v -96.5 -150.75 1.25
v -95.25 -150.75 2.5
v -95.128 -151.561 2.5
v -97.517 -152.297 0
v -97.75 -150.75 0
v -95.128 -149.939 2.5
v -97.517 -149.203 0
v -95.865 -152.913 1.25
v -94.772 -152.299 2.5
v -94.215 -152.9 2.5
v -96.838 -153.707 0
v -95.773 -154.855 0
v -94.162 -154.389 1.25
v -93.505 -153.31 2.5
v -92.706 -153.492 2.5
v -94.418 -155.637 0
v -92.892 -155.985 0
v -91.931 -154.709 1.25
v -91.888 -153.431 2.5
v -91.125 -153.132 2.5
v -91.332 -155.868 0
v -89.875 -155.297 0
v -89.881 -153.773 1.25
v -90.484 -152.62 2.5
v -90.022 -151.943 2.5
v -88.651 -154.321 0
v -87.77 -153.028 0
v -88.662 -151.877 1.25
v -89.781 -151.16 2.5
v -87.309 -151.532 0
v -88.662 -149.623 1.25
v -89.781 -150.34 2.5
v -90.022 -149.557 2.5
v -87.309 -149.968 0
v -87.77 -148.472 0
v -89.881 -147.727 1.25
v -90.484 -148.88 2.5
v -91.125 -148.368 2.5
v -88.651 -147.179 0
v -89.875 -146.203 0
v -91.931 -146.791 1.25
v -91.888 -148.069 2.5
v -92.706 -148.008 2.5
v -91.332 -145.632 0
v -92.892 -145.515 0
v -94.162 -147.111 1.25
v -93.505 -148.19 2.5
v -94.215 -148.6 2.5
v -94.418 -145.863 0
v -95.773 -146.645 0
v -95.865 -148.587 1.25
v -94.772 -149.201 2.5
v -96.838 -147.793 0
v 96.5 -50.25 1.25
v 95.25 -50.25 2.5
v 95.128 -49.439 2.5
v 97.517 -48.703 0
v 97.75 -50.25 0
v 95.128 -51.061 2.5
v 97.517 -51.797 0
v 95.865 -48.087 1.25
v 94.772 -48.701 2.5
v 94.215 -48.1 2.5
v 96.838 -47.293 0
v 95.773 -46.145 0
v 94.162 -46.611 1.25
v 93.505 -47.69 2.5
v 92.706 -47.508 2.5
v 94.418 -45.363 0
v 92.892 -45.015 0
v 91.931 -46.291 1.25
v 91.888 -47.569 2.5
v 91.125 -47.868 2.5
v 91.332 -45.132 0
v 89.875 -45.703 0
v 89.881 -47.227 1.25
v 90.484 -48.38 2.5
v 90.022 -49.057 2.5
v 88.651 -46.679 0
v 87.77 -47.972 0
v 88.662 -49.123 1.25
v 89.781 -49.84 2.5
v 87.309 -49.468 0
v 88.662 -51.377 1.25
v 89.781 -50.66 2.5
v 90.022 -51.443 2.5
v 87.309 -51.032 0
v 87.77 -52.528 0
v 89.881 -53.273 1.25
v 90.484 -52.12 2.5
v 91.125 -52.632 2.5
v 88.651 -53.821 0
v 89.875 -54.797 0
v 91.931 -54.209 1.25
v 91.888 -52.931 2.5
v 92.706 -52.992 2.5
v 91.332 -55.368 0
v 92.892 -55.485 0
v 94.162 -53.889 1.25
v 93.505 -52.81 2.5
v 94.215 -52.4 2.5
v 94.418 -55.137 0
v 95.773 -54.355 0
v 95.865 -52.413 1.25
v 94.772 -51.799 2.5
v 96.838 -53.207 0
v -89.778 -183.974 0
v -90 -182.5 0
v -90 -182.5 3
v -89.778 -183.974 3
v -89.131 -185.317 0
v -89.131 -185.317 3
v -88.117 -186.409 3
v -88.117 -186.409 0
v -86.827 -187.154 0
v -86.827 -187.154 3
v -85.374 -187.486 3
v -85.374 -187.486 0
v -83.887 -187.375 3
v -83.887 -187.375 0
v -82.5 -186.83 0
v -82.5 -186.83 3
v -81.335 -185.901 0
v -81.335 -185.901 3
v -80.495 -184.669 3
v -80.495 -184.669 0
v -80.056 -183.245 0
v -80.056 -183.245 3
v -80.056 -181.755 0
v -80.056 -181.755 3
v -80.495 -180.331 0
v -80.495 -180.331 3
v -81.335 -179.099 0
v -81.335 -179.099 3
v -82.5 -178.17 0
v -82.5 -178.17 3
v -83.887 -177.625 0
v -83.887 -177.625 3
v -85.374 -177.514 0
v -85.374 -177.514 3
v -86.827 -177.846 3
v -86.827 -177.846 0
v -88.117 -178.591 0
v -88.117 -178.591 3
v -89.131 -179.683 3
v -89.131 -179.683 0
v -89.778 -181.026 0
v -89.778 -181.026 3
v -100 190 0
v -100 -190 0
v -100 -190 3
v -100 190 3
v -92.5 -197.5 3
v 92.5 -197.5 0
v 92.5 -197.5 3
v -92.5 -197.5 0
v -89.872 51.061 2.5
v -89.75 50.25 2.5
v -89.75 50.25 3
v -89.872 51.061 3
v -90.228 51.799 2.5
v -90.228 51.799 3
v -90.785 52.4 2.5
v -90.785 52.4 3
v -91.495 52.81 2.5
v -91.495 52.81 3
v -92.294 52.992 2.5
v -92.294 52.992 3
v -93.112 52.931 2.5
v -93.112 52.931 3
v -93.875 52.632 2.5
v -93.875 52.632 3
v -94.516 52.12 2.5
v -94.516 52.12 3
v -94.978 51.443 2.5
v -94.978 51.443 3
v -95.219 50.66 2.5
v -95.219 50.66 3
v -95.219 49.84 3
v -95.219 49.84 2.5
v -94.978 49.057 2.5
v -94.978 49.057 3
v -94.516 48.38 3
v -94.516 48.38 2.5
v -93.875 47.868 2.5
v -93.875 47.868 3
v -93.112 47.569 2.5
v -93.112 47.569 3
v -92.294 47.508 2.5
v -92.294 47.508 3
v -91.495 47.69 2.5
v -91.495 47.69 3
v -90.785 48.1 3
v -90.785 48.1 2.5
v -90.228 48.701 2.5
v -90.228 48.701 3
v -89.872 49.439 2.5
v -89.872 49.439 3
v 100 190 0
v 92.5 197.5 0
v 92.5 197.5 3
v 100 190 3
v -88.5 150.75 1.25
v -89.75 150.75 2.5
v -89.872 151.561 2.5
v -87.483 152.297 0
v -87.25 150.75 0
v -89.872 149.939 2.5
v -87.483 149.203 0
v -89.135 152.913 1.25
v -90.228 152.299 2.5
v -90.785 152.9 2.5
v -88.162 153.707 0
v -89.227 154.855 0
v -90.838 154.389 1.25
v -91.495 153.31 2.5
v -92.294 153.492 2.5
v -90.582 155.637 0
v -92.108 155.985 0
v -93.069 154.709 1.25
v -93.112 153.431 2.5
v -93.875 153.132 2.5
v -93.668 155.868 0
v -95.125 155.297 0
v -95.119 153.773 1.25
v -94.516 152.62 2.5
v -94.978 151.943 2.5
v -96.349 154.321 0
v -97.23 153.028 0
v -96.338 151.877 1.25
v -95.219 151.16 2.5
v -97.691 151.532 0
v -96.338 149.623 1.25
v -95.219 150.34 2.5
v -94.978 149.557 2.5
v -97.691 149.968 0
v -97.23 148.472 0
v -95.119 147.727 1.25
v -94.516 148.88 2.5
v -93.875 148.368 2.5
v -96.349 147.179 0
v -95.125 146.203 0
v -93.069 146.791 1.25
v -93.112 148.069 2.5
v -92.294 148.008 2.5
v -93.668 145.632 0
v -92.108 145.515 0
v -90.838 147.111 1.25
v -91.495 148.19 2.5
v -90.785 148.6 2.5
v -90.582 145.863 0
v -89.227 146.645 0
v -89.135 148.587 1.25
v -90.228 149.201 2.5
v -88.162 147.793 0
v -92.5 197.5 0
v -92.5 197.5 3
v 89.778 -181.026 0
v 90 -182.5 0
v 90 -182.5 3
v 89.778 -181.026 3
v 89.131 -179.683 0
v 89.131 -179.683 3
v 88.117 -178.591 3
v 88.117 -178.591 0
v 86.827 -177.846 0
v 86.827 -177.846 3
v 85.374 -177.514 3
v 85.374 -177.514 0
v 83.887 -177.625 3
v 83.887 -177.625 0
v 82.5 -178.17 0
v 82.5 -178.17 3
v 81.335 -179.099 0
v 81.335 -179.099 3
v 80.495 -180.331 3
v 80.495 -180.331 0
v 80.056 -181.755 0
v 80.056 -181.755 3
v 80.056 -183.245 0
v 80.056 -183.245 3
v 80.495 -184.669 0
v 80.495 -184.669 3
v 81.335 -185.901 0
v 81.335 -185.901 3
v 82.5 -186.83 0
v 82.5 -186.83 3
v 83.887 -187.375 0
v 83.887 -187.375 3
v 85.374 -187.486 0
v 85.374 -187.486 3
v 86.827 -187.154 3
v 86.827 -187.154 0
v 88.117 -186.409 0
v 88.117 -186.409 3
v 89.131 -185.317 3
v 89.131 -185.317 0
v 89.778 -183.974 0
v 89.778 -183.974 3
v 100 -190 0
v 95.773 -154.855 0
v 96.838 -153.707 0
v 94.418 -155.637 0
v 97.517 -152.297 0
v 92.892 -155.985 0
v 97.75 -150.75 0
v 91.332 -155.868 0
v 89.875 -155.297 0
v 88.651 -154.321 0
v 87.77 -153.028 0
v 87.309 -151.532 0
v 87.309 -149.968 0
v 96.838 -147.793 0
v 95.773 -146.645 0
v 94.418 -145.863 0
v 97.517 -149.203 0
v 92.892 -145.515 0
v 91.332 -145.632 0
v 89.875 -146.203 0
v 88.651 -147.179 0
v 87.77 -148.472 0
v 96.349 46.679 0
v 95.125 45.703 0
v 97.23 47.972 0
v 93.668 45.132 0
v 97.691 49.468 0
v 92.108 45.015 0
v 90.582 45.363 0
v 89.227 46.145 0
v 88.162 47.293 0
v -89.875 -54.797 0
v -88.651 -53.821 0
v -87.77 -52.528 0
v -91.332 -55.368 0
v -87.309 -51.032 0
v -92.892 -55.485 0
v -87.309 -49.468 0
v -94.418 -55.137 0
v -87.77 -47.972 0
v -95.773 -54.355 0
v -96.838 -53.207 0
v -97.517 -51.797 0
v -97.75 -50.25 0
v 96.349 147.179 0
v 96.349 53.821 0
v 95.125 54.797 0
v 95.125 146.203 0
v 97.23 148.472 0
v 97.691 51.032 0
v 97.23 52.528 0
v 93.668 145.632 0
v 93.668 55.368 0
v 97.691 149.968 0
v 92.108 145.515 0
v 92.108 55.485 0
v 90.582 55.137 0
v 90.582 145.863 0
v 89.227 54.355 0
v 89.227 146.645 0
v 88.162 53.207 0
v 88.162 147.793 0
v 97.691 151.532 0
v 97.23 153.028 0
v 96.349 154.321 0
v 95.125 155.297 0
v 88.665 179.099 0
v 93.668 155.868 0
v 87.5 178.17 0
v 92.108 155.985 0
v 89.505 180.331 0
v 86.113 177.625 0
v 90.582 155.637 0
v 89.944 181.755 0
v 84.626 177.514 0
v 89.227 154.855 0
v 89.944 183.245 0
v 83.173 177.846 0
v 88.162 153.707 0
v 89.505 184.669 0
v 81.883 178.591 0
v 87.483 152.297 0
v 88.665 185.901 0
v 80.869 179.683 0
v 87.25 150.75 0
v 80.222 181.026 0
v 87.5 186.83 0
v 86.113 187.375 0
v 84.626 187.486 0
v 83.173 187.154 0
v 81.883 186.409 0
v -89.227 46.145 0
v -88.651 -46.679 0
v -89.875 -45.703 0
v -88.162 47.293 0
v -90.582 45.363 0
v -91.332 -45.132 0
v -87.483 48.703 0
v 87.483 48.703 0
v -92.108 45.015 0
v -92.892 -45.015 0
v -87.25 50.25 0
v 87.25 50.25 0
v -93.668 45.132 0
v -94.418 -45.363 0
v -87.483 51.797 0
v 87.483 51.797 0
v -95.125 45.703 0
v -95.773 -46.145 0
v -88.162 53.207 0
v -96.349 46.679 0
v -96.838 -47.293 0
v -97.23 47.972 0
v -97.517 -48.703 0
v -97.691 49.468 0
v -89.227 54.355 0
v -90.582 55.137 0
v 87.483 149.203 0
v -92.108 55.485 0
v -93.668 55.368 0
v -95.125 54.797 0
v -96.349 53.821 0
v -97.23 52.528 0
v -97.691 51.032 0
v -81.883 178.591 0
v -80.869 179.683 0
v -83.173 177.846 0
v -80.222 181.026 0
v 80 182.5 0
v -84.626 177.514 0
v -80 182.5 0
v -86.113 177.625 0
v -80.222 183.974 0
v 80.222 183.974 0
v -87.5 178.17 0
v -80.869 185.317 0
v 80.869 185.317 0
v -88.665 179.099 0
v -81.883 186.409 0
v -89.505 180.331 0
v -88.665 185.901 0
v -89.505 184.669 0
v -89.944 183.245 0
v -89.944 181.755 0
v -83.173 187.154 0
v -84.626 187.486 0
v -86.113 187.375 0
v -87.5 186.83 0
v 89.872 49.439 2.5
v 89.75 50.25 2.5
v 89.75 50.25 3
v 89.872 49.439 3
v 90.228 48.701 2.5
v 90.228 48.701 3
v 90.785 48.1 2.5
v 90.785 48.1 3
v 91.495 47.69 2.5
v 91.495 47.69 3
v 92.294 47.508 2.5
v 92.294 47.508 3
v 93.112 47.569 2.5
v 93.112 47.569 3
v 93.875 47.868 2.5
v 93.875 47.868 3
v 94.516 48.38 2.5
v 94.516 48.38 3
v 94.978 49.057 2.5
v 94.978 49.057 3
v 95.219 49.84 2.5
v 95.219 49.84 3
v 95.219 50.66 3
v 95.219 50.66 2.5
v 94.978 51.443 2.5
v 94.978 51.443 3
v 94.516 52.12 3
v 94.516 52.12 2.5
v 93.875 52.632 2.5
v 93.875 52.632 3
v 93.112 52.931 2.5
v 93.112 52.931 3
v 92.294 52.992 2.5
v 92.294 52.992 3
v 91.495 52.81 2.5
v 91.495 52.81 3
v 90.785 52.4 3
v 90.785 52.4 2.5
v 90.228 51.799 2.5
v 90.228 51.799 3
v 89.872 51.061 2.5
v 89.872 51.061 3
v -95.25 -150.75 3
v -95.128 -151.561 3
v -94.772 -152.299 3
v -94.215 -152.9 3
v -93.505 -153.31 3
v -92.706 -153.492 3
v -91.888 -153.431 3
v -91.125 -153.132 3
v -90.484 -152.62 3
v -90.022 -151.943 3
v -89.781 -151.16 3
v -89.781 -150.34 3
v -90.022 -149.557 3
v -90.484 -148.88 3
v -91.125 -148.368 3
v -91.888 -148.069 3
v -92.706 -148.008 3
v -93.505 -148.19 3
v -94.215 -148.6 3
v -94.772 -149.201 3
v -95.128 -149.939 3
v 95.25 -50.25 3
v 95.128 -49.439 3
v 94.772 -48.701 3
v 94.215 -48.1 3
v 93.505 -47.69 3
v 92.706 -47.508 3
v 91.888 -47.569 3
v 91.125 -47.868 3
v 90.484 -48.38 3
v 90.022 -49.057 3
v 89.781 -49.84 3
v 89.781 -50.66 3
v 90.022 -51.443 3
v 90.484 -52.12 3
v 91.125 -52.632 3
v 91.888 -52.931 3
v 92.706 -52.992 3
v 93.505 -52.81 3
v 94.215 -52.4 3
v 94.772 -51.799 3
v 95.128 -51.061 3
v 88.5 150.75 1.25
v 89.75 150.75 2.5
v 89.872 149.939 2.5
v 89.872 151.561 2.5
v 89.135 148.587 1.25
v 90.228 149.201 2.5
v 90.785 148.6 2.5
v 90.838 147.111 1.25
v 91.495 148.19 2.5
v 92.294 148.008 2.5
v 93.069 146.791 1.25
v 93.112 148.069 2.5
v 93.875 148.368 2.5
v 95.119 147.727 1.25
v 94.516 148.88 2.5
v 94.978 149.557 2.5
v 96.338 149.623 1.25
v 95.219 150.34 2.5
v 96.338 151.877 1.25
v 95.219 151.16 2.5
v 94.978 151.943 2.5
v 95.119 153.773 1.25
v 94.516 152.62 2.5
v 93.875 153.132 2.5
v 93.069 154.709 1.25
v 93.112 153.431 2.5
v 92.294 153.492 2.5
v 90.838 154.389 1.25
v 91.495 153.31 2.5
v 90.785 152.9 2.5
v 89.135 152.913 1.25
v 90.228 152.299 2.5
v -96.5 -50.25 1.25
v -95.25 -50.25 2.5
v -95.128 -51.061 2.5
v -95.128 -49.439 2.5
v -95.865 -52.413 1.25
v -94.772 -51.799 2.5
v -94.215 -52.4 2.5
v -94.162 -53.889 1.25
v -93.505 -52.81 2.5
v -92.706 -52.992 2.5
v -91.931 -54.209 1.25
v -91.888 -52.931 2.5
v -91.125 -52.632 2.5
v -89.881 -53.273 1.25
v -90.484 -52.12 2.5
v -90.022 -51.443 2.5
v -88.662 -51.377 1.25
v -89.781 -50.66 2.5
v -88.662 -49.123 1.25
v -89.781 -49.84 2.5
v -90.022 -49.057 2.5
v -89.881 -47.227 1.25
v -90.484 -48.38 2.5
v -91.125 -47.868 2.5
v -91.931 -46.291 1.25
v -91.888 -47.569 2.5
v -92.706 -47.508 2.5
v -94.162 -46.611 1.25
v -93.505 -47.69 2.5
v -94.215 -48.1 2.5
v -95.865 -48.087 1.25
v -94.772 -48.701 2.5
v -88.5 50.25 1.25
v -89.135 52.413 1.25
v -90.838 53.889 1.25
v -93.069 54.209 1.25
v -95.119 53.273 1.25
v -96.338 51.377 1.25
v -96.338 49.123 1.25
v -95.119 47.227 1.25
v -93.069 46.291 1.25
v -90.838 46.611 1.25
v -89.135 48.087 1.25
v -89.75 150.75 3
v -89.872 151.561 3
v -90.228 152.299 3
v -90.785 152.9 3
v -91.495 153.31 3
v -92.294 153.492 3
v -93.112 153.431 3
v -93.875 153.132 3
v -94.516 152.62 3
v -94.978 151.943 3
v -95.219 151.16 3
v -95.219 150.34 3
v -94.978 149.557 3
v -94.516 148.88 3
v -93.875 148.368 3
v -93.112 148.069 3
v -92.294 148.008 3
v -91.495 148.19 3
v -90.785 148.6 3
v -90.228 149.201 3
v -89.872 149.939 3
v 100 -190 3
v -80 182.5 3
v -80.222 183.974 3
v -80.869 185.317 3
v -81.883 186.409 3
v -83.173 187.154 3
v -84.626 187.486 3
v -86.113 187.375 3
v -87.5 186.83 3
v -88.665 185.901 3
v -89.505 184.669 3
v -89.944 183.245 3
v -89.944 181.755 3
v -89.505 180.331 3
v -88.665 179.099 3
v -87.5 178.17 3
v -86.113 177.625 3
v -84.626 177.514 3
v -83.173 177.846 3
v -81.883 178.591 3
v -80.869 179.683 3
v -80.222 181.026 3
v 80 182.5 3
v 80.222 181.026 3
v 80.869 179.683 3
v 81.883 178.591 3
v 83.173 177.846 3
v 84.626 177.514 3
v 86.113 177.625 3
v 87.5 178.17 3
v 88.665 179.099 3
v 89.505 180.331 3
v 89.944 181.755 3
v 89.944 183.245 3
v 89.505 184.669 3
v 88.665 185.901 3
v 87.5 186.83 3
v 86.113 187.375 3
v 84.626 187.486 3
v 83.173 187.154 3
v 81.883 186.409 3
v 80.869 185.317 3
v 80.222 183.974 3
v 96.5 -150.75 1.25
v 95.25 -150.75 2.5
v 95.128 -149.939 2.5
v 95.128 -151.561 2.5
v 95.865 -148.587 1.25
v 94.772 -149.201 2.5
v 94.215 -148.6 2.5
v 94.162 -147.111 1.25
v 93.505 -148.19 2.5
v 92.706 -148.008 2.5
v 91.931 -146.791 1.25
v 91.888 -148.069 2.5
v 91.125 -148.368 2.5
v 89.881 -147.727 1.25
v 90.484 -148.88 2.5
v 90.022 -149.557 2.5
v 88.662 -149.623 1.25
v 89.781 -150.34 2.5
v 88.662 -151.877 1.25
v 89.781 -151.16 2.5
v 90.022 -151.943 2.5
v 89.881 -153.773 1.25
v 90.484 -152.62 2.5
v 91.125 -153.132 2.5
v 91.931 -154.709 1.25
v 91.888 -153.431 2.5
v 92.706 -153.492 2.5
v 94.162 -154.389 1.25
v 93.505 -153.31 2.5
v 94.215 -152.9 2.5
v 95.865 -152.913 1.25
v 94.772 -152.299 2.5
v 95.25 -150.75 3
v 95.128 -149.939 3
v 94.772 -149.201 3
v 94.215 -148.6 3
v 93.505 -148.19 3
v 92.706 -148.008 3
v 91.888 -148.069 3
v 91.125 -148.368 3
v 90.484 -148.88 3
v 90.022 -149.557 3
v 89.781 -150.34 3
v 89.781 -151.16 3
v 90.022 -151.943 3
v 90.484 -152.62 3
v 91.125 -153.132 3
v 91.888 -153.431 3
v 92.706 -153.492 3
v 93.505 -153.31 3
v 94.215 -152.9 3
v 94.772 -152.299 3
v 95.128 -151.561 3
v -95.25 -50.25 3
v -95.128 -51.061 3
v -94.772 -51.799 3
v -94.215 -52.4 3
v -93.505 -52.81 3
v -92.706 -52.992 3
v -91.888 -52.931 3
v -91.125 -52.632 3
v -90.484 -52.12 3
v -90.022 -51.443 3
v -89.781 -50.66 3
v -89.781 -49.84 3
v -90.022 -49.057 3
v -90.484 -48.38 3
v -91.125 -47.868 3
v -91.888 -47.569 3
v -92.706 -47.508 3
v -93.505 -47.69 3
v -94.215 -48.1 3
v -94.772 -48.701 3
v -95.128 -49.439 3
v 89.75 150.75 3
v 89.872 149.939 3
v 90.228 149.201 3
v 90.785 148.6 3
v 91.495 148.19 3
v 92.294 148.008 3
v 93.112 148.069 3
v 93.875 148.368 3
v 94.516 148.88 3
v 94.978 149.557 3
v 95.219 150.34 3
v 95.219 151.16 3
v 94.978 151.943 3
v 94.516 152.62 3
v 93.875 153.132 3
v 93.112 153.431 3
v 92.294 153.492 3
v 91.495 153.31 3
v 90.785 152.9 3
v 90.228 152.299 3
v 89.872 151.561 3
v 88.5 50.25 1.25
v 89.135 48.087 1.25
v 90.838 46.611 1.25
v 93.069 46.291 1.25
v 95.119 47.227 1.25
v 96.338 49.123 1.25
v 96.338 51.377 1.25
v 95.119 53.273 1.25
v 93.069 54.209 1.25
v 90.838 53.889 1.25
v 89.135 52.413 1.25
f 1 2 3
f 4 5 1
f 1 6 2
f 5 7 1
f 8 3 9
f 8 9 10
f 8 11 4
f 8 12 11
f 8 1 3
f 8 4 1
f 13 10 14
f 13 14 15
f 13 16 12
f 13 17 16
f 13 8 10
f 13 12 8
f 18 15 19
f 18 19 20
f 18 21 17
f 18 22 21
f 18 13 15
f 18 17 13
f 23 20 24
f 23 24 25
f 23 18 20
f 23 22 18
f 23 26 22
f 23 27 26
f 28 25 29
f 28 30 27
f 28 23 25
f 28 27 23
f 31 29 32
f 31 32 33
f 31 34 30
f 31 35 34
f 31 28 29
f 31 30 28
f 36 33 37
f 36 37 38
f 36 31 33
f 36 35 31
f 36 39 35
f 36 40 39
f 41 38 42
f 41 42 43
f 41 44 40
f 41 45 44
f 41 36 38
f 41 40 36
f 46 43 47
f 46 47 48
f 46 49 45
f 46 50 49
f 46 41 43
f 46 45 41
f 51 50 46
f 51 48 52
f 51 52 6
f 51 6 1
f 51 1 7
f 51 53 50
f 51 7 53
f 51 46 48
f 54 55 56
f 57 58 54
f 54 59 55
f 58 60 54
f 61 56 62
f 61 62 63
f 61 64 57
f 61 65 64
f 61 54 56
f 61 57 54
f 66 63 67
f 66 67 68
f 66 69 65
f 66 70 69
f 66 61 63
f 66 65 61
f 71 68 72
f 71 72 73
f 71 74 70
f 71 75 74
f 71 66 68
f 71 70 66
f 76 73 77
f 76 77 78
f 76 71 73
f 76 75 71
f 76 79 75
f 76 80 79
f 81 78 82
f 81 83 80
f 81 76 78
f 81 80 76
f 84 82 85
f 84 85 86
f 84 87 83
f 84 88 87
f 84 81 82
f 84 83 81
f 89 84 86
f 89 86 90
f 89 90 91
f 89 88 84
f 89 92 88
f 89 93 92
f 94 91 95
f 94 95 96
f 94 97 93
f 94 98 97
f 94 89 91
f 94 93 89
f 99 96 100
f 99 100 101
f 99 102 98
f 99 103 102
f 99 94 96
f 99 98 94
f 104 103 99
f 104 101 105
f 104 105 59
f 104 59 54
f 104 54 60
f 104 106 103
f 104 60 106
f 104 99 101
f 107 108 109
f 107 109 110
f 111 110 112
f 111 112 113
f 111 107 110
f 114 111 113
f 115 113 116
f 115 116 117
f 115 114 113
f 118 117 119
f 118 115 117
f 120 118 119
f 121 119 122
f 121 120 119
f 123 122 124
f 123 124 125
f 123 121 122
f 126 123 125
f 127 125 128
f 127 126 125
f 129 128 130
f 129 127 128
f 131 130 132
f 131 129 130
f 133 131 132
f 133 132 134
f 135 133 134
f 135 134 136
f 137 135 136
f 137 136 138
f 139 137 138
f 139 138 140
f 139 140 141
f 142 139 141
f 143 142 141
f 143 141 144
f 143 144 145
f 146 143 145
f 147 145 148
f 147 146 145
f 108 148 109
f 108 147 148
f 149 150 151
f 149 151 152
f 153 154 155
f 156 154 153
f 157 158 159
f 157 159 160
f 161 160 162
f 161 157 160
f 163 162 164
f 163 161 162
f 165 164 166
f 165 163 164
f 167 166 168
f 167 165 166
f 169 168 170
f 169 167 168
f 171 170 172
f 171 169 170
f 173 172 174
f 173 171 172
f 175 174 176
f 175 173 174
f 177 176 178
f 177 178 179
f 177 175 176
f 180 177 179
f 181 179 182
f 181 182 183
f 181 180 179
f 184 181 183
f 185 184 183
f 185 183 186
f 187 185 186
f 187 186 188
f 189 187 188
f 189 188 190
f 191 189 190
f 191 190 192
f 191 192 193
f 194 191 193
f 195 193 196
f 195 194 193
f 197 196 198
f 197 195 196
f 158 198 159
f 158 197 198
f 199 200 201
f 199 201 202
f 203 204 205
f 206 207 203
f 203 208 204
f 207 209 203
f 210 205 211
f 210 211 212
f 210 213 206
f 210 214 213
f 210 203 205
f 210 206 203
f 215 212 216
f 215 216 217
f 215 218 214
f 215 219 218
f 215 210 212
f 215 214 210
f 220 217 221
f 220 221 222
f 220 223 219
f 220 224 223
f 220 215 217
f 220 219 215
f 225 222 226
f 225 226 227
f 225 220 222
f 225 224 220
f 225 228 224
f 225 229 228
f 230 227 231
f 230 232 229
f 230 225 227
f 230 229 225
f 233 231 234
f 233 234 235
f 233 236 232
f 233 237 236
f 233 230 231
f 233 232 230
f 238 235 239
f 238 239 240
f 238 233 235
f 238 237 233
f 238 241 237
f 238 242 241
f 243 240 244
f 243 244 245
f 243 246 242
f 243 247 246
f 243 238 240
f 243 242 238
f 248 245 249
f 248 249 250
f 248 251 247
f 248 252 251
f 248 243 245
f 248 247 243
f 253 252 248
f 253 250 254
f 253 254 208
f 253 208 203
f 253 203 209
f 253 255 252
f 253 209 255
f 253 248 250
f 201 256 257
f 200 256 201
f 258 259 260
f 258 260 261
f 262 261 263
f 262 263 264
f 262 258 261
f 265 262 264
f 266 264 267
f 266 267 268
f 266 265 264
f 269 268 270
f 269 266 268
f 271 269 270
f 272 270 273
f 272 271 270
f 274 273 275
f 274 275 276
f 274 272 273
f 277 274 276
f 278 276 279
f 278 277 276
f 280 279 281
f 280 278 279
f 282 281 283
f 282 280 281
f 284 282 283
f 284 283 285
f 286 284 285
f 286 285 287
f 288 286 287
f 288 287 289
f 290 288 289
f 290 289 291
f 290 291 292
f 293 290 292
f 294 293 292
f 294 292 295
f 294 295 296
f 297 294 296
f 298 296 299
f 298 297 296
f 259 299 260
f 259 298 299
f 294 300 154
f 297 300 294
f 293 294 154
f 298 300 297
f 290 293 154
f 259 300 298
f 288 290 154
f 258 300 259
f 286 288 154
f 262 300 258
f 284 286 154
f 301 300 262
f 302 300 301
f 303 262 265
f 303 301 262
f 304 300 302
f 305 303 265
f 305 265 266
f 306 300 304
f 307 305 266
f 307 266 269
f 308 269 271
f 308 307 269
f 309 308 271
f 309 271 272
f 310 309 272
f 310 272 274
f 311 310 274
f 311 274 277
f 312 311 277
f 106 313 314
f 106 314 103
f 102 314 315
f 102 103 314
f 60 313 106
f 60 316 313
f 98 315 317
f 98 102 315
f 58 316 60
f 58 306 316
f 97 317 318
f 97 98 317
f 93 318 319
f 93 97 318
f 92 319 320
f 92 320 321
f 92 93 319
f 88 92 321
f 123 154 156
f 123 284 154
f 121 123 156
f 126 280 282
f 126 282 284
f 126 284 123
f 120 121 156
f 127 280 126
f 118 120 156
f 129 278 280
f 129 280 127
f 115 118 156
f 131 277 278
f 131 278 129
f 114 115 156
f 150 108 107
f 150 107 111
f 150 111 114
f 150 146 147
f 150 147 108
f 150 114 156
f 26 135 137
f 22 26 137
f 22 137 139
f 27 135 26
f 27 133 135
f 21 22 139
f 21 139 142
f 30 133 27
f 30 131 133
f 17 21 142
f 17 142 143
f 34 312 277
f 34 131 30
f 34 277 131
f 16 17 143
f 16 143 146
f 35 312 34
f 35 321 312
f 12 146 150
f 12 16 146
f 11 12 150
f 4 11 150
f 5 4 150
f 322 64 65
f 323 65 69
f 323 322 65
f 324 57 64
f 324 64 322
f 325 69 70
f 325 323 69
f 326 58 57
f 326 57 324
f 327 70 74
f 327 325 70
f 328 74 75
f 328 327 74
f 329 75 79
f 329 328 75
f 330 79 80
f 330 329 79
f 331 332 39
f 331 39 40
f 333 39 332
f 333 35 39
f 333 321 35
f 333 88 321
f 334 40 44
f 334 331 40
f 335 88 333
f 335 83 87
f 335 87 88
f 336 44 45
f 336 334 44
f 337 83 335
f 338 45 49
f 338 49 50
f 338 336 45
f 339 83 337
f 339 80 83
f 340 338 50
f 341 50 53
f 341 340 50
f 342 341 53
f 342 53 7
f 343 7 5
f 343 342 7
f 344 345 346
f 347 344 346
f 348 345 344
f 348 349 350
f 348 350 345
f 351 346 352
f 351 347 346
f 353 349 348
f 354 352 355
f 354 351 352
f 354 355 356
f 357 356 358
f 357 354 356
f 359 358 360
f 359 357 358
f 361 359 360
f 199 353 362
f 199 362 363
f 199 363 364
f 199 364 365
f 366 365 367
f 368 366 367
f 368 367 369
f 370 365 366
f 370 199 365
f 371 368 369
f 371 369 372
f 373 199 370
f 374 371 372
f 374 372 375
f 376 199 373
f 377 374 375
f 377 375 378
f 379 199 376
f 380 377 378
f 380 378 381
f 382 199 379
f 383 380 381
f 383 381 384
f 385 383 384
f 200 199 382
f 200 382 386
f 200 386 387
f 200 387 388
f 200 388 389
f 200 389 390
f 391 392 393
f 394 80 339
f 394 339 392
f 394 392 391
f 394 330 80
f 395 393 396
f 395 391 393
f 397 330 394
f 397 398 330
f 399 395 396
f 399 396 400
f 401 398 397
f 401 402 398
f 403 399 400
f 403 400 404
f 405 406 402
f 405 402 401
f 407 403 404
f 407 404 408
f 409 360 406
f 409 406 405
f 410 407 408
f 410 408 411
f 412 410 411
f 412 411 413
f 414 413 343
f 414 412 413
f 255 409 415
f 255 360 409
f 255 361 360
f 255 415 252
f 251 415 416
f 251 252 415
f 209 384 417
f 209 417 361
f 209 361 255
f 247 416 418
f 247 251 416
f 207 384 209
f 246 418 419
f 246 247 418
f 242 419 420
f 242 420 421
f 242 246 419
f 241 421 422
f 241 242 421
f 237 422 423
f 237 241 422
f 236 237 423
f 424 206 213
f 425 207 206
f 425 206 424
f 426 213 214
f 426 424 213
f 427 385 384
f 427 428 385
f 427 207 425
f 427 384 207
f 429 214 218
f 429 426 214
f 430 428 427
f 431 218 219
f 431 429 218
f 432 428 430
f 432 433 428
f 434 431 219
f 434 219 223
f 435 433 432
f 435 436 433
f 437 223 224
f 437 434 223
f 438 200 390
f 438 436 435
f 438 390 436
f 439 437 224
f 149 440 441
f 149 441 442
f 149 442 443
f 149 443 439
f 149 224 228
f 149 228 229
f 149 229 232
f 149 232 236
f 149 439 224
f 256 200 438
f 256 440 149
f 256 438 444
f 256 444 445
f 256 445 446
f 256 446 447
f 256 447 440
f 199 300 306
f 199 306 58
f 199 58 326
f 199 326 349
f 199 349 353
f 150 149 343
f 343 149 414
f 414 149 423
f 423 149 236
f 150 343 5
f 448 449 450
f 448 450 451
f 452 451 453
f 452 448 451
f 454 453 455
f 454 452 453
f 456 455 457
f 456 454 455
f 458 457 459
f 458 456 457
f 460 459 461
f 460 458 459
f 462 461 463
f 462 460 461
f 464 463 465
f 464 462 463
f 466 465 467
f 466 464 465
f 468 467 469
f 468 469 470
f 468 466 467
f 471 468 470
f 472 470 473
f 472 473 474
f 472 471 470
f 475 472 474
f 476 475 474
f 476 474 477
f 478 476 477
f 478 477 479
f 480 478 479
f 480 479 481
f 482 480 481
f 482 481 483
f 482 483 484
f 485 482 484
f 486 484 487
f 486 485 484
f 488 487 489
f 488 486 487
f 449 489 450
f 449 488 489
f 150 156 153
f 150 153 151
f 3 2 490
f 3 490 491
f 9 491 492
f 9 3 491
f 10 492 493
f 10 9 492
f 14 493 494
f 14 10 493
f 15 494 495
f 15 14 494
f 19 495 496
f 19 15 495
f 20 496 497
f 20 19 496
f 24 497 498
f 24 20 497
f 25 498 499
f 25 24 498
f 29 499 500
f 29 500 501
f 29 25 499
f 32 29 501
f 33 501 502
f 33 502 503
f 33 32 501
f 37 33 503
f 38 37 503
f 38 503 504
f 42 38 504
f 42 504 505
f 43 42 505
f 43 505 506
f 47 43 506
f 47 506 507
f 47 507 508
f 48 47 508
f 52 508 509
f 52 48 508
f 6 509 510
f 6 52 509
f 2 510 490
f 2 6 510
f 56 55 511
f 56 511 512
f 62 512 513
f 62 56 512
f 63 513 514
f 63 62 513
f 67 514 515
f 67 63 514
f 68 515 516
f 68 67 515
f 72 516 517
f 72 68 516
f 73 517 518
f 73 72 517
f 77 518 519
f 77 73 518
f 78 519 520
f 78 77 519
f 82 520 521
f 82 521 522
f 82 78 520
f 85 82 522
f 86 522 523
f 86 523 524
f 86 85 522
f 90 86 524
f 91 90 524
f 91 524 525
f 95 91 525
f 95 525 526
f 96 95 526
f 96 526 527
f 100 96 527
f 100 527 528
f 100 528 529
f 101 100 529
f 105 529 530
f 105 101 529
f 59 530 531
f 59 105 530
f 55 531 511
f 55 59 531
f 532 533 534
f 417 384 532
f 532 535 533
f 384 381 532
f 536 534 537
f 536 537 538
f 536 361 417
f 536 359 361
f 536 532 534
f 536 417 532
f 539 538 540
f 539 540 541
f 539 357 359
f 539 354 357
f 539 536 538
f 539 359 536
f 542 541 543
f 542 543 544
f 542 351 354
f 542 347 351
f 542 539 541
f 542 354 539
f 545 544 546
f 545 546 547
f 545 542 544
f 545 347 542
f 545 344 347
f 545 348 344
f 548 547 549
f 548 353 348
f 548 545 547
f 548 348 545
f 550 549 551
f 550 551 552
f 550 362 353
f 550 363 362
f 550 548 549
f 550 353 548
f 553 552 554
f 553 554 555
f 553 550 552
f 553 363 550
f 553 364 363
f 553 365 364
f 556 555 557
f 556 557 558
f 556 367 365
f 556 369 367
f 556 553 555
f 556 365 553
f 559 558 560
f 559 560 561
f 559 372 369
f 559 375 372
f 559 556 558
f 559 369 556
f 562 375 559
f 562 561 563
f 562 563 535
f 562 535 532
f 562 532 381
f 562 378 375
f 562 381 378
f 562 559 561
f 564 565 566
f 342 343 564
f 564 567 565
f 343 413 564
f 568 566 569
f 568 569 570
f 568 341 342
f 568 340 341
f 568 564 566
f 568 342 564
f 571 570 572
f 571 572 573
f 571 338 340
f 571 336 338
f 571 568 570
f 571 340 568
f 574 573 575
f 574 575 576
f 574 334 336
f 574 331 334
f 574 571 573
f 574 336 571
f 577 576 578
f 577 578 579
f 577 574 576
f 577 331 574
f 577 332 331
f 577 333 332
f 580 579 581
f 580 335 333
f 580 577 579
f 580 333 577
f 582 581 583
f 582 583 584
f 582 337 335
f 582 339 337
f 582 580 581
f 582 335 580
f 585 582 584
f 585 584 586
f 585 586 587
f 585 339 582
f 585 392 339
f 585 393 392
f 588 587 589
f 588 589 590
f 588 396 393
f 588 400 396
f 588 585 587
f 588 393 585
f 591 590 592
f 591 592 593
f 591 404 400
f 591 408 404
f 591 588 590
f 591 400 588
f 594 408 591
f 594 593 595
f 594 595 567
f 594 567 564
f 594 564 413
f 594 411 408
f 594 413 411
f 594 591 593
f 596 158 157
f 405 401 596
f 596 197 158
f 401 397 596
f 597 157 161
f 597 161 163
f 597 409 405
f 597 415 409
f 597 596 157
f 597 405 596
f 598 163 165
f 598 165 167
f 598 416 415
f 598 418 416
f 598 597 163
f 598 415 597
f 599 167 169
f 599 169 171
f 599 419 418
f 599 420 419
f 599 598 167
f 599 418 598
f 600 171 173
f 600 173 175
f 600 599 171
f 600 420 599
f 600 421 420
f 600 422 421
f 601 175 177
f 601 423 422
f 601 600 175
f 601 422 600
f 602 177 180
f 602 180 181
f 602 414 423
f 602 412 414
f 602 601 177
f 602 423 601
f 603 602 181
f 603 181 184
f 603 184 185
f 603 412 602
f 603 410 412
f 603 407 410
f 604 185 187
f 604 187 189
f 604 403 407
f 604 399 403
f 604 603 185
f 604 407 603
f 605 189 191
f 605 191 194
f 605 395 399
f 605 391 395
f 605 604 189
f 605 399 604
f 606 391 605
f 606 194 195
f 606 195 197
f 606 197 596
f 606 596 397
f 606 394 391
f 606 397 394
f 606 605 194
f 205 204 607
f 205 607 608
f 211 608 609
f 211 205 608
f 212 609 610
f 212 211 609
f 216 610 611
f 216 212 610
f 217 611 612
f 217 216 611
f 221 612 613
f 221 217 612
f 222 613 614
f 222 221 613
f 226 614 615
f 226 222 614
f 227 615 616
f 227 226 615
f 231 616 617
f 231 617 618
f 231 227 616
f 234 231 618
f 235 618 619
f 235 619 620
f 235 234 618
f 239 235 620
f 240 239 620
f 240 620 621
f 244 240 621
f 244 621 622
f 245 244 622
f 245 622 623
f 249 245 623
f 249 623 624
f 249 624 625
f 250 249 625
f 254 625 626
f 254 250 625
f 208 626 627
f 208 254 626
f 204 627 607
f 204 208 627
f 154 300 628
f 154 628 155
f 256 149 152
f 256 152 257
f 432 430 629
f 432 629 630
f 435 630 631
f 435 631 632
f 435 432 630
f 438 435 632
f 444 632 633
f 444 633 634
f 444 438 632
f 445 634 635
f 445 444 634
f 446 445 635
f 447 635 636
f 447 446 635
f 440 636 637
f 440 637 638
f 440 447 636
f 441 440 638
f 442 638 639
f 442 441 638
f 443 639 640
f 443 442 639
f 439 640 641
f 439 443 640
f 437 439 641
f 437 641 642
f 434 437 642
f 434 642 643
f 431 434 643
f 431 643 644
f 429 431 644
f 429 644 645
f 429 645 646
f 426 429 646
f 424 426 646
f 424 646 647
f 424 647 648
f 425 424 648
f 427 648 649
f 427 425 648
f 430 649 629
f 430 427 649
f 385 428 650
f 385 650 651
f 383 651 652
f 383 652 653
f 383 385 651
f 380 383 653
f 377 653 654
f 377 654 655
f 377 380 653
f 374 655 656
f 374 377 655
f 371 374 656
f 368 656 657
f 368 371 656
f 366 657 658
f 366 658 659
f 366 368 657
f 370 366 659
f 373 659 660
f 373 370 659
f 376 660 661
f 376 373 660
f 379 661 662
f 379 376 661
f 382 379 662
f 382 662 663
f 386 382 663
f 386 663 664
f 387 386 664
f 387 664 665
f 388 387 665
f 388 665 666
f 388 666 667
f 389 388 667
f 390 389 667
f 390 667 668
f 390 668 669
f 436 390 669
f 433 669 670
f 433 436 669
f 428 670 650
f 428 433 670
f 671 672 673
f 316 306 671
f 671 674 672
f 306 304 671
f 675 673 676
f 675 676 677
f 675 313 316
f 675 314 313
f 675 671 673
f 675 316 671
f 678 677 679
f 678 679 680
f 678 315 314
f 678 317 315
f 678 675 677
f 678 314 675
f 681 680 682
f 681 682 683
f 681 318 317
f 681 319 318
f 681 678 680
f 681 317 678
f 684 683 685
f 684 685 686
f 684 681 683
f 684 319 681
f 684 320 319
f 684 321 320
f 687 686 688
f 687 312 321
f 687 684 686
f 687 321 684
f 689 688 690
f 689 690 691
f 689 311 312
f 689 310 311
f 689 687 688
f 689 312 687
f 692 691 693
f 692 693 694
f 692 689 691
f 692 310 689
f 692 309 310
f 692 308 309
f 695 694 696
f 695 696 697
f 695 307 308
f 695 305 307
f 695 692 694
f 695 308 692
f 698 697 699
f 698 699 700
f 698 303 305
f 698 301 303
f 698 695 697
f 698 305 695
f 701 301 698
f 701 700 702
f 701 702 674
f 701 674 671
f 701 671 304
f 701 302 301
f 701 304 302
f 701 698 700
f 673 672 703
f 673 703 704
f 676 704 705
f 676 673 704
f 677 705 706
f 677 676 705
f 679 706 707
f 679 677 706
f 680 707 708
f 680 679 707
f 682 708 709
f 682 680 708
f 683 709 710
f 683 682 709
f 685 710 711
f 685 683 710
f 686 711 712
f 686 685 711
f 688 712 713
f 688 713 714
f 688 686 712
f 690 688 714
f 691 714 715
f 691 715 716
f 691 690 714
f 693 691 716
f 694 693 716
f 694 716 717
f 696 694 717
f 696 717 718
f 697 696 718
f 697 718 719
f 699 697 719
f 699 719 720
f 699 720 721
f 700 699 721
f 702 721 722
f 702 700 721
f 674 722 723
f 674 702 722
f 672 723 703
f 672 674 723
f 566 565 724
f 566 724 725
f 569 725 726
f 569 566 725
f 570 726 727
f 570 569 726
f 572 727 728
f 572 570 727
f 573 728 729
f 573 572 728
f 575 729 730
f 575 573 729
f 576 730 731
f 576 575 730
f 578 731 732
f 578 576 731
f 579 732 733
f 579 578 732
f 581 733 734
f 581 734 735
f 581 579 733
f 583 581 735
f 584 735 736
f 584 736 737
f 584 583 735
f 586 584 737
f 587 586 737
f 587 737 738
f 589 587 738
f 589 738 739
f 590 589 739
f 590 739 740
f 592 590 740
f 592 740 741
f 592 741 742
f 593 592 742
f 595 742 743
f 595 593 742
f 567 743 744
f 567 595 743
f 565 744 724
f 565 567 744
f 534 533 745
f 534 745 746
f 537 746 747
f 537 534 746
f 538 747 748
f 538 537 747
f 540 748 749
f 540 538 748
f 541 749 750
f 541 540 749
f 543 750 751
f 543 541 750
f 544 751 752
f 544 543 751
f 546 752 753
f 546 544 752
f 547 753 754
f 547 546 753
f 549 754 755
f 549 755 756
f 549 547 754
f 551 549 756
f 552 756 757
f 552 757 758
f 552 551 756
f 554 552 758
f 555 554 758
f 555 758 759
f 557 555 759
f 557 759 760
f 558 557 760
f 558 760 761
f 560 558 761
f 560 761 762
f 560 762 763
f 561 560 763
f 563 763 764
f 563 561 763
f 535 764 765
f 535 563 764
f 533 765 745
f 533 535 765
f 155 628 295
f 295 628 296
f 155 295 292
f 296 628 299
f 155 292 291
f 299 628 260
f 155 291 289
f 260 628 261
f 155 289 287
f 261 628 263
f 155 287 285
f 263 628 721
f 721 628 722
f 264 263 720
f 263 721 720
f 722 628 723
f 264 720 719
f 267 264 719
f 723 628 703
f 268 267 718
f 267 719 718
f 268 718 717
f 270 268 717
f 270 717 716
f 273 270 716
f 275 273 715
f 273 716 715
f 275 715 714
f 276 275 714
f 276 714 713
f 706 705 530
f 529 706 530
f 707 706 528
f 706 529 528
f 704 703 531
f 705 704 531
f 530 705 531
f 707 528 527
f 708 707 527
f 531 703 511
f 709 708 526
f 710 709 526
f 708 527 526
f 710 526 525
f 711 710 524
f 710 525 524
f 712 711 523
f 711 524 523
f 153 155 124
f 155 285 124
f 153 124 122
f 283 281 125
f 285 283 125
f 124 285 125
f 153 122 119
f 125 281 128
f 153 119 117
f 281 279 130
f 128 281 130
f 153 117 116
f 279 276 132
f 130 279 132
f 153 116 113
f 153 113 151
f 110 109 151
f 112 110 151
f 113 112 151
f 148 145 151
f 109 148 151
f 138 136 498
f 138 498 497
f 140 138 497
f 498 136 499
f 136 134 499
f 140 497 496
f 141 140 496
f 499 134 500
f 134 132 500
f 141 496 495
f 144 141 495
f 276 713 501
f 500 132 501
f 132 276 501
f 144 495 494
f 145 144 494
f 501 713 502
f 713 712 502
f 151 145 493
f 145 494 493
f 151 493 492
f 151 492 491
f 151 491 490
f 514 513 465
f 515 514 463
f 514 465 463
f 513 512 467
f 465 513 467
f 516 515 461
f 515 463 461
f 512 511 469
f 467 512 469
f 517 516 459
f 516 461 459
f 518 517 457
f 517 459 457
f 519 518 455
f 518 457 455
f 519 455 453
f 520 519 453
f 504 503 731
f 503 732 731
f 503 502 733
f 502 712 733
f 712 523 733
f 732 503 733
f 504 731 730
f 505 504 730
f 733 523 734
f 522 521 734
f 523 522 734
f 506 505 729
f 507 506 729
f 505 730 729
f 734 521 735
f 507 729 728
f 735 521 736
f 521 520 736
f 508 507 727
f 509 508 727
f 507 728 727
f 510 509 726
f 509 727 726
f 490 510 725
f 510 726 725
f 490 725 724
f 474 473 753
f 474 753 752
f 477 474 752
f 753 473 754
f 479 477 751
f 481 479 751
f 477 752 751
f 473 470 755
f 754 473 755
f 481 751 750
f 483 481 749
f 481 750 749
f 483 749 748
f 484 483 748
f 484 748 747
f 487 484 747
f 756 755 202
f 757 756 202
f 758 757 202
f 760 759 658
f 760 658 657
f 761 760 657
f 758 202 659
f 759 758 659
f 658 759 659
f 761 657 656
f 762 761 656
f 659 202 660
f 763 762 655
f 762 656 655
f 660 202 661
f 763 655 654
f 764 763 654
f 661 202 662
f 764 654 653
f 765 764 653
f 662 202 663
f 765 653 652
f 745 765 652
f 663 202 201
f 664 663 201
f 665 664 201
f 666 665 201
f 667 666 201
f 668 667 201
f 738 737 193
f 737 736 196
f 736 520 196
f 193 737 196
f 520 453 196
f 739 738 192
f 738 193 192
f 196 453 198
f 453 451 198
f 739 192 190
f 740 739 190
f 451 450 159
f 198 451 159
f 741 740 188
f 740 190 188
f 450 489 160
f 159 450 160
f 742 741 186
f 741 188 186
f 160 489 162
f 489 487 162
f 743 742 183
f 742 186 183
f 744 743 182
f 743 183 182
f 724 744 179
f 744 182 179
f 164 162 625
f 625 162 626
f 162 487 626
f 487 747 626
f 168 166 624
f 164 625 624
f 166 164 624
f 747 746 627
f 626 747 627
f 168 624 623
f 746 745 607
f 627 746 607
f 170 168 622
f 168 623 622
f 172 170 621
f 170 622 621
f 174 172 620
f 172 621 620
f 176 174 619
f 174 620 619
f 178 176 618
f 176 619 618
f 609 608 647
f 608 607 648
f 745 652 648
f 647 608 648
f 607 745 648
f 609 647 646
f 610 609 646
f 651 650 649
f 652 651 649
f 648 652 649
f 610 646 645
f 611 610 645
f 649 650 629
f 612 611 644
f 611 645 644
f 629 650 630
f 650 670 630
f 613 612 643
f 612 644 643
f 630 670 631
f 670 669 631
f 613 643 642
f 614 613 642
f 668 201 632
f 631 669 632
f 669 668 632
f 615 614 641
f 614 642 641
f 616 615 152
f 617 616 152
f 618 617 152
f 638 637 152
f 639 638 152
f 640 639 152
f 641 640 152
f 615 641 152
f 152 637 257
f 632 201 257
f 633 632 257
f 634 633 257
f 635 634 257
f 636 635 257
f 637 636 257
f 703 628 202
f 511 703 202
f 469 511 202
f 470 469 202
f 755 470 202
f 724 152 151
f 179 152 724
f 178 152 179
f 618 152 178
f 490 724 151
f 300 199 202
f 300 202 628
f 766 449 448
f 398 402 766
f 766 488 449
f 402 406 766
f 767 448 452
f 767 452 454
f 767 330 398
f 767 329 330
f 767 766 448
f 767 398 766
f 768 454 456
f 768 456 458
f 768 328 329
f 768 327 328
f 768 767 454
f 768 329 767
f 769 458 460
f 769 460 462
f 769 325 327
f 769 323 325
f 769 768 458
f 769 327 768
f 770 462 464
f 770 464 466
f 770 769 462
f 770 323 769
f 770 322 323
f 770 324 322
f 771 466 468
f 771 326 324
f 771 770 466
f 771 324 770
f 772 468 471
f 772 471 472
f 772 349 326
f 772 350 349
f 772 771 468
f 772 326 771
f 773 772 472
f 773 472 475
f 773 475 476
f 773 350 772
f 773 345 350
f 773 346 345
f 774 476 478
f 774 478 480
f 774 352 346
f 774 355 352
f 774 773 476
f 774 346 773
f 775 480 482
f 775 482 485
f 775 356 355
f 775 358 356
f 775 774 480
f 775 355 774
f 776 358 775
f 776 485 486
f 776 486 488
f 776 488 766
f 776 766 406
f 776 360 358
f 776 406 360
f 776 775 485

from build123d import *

# Parameters (mm, degrees)
SKETCH_1_R      = 5
SKETCH_1_R_2    = 2.75
EXTRUDE_1_DEPTH = 3
CHAMFER_1_SIZE  = 2.5


with BuildPart() as part:
    # Эскиз1 → Вытянуть1 (new body)
    with BuildSketch(Plane.XY):
        Polygon((-100, 190), (-92.5, 197.5), (92.5, 197.5), (100, 190), (100, -190), (92.5, -197.5), (-92.5, -197.5), (-100, -190), align=None)
        with Locations((-85, 182.5)):
            Circle(SKETCH_1_R, mode=Mode.SUBTRACT)
        with Locations(Location((85, 182.5, 0), (0, 0, 180))):
            Circle(SKETCH_1_R, mode=Mode.SUBTRACT)
        with Locations((85, -182.5)):
            Circle(SKETCH_1_R, mode=Mode.SUBTRACT)
        with Locations(Location((-85, -182.5, 0), (0, 0, 180))):
            Circle(SKETCH_1_R, mode=Mode.SUBTRACT)
        with Locations((-92.5, 150.75)):
            Circle(SKETCH_1_R_2, mode=Mode.SUBTRACT)
        with Locations(Location((-92.5, -150.75, 0), (0, 0, 180))):
            Circle(SKETCH_1_R_2, mode=Mode.SUBTRACT)
        with Locations((-92.5, 50.25)):
            Circle(SKETCH_1_R_2, mode=Mode.SUBTRACT)
        with Locations(Location((-92.5, -50.25, 0), (0, 0, 180))):
            Circle(SKETCH_1_R_2, mode=Mode.SUBTRACT)
        with Locations(Location((92.5, 150.75, 0), (0, 0, 180))):
            Circle(SKETCH_1_R_2, mode=Mode.SUBTRACT)
        with Locations(Location((92.5, 50.25, 0), (0, 0, 180))):
            Circle(SKETCH_1_R_2, mode=Mode.SUBTRACT)
        with Locations((92.5, -50.25)):
            Circle(SKETCH_1_R_2, mode=Mode.SUBTRACT)
        with Locations((92.5, -150.75)):
            Circle(SKETCH_1_R_2, mode=Mode.SUBTRACT)
    extrude(amount=EXTRUDE_1_DEPTH)

    # Фаска1
    chamfer_1_edges = [part.edges().sort_by_distance(p)[0] for p in [
        (-95.25, 150.75, 0),
        (-89.75, -150.75, 0),
        (-95.25, 50.25, 0),
        (-89.75, -50.25, 0),
        (95.25, 150.75, 0),
        (95.25, 50.25, 0),
        (89.75, -50.25, 0),
        (89.75, -150.75, 0),
    ]]
    chamfer(chamfer_1_edges, length=CHAMFER_1_SIZE)


solid = part.part
